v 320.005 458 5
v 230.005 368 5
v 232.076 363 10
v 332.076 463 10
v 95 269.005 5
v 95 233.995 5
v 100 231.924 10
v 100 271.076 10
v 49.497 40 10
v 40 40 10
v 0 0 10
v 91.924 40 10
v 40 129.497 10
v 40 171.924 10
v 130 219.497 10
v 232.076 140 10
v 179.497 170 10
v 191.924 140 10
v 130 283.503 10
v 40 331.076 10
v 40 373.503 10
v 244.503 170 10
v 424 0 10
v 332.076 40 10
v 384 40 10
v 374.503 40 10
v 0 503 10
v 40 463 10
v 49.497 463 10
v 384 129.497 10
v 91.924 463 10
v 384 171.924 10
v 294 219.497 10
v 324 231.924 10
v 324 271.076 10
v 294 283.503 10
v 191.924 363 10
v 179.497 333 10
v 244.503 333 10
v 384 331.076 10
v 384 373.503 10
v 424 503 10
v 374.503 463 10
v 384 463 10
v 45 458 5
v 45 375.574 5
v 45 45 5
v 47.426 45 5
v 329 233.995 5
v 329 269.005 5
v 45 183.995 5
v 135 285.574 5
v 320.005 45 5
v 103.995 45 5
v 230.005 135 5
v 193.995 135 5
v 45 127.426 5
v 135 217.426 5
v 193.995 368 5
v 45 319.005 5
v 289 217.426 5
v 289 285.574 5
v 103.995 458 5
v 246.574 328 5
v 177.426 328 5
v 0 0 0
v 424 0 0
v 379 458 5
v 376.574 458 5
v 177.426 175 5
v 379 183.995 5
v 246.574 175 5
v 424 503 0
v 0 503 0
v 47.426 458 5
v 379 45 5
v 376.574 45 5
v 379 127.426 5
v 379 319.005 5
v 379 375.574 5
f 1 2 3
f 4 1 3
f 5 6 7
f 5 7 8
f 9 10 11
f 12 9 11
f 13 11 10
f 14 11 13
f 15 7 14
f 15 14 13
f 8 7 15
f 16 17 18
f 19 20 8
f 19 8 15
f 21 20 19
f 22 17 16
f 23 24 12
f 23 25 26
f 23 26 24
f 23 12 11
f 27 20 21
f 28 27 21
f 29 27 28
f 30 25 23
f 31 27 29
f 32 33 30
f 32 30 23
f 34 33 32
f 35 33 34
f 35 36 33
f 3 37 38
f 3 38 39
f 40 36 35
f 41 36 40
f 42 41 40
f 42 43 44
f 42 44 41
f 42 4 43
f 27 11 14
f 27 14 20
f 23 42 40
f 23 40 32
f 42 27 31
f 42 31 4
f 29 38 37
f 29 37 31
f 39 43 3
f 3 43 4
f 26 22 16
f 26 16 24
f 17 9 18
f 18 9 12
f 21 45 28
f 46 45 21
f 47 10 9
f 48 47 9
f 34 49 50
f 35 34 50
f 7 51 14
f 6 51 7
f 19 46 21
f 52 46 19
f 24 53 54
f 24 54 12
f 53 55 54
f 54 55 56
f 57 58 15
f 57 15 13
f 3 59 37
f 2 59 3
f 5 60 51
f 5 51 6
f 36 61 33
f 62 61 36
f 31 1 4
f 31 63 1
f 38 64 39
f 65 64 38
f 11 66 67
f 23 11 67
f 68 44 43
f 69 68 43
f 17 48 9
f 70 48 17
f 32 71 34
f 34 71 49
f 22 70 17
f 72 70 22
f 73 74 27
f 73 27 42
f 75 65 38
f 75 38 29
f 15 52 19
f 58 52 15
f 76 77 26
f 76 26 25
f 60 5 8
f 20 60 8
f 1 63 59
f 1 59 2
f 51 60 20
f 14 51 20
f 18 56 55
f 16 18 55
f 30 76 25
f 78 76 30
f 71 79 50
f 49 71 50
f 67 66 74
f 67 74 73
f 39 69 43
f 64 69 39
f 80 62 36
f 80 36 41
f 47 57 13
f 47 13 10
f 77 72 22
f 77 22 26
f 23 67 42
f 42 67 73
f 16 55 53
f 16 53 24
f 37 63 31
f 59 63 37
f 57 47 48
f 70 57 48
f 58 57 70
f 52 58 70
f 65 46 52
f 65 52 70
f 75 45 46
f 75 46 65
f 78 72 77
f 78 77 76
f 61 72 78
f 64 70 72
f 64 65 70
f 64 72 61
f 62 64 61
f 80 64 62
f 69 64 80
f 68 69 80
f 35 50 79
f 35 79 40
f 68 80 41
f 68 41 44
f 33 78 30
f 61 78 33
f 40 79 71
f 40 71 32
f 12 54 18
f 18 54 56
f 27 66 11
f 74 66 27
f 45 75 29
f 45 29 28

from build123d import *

# Parameters (mm, degrees)
ESQUISSE1_W             = 424
ESQUISSE1_H             = 503
BOSS_EXTRU_1_DEPTH      = 10
ENL_V_MAT_EXTRU_1_DEPTH = 5
CHANFREIN1_SIZE         = 5


with BuildPart() as part:
    # Esquisse1 → Boss.-Extru.1 (new body)
    with BuildSketch(Plane.XY):
        with Locations((212, 251.5)):
            Rectangle(ESQUISSE1_W, ESQUISSE1_H)
    extrude(amount=BOSS_EXTRU_1_DEPTH)

    # Esquisse2 → Enlèv. mat.-Extru.1 (cut)
    with BuildSketch(Plane.XY.offset(10)):
        Polygon((100, 231.923881554), (100, 271.076118446), (40, 331.076118446), (40, 171.923881554), align=None)
        Polygon((191.923881554, 363), (232.076118446, 363), (332.076118446, 463), (91.923881554, 463), align=None)
        Polygon((40, 463), (40, 373.502525317), (130, 283.502525317), (130, 219.497474683), (40, 129.497474683), (40, 40), (49.497474683, 40), (179.497474683, 170), (244.502525317, 170), (374.502525317, 40), (384, 40), (384, 129.497474683), (294, 219.497474683), (294, 283.502525317), (384, 373.502525317), (384, 463), (374.502525317, 463), (244.502525317, 333), (179.497474683, 333), (49.497474683, 463), align=None)
        Polygon((324, 231.923881554), (324, 271.076118446), (384, 331.076118446), (384, 171.923881554), align=None)
        Polygon((332.076118446, 40), (91.923881554, 40), (191.923881554, 140), (232.076118446, 140), align=None)
    extrude(amount=-ENL_V_MAT_EXTRU_1_DEPTH, mode=Mode.SUBTRACT)

    # Chanfrein1
    chanfrein1_edges = [part.edges().sort_by_distance(p)[0] for p in [
        (212, 40, 5),
        (141.923881554, 90, 5),
        (212, 140, 5),
        (282.076118446, 90, 5),
        (40, 251.5, 5),
        (70, 301.076118446, 5),
        (100, 251.5, 5),
        (70, 201.923881554, 5),
        (384, 251.5, 5),
        (354, 201.923881554, 5),
        (324, 251.5, 5),
        (354, 301.076118446, 5),
        (114.497474683, 398, 5),
        (212, 333, 5),
        (309.502525317, 398, 5),
        (379.251262658, 463, 5),
        (384, 418.251262658, 5),
        (339, 328.502525317, 5),
        (294, 251.5, 5),
        (339, 174.497474683, 5),
        (384, 84.748737342, 5),
        (379.251262658, 40, 5),
        (309.502525317, 105, 5),
        (212, 170, 5),
        (114.497474683, 105, 5),
        (44.748737342, 40, 5),
        (40, 84.748737342, 5),
        (85, 174.497474683, 5),
        (130, 251.5, 5),
        (85, 328.502525317, 5),
        (40, 418.251262658, 5),
        (44.748737342, 463, 5),
        (212, 463, 5),
        (282.076118446, 413, 5),
        (212, 363, 5),
        (141.923881554, 413, 5),
    ]]
    chamfer(chanfrein1_edges, length=CHANFREIN1_SIZE - 0.0001)  # a hair under: the kernel refuses the full size


solid = part.part
